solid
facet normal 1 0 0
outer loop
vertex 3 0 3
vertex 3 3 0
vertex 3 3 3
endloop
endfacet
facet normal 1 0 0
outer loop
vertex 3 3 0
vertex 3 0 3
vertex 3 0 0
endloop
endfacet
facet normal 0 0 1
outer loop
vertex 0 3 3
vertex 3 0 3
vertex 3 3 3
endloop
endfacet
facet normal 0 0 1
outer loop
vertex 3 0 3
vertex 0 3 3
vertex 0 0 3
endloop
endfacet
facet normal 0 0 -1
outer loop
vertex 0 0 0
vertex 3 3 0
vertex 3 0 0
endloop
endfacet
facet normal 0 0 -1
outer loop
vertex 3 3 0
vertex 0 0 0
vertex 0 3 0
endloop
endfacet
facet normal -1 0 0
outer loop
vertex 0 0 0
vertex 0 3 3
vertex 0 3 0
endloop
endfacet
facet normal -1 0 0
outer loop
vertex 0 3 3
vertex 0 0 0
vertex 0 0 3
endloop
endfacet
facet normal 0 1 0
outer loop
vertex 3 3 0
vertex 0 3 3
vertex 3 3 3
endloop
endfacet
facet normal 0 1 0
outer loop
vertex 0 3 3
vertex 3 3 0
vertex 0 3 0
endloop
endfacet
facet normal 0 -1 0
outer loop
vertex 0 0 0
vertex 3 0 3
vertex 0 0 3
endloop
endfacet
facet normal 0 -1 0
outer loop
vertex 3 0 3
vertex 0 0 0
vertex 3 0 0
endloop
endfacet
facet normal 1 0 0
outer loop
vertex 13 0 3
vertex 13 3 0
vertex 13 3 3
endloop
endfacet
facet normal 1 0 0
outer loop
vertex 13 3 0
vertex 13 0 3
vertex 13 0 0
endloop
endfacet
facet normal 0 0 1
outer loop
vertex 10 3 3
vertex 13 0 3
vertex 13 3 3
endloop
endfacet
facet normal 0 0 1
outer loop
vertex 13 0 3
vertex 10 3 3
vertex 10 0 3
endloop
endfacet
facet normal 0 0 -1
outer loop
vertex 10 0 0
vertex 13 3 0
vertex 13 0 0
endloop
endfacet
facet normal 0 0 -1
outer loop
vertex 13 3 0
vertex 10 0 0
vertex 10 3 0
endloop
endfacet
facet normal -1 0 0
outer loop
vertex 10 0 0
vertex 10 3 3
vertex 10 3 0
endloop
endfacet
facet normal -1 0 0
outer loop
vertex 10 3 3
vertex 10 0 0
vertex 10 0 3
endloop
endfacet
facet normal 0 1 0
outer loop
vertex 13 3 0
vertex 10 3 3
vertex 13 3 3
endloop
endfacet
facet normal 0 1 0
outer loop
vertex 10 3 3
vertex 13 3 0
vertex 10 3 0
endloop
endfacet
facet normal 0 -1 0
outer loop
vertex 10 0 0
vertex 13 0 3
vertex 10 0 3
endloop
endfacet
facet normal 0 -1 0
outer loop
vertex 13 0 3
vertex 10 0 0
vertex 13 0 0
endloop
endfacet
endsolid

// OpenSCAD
// color() WITH MORE THAN ONE CHILD BEHAVES AS A GROUP. Verified at the binary:
// 24 facets, both cubes present.
color("blue") {
  cube([3, 3, 3]);
  translate([10, 0, 0]) cube([3, 3, 3]);
}
